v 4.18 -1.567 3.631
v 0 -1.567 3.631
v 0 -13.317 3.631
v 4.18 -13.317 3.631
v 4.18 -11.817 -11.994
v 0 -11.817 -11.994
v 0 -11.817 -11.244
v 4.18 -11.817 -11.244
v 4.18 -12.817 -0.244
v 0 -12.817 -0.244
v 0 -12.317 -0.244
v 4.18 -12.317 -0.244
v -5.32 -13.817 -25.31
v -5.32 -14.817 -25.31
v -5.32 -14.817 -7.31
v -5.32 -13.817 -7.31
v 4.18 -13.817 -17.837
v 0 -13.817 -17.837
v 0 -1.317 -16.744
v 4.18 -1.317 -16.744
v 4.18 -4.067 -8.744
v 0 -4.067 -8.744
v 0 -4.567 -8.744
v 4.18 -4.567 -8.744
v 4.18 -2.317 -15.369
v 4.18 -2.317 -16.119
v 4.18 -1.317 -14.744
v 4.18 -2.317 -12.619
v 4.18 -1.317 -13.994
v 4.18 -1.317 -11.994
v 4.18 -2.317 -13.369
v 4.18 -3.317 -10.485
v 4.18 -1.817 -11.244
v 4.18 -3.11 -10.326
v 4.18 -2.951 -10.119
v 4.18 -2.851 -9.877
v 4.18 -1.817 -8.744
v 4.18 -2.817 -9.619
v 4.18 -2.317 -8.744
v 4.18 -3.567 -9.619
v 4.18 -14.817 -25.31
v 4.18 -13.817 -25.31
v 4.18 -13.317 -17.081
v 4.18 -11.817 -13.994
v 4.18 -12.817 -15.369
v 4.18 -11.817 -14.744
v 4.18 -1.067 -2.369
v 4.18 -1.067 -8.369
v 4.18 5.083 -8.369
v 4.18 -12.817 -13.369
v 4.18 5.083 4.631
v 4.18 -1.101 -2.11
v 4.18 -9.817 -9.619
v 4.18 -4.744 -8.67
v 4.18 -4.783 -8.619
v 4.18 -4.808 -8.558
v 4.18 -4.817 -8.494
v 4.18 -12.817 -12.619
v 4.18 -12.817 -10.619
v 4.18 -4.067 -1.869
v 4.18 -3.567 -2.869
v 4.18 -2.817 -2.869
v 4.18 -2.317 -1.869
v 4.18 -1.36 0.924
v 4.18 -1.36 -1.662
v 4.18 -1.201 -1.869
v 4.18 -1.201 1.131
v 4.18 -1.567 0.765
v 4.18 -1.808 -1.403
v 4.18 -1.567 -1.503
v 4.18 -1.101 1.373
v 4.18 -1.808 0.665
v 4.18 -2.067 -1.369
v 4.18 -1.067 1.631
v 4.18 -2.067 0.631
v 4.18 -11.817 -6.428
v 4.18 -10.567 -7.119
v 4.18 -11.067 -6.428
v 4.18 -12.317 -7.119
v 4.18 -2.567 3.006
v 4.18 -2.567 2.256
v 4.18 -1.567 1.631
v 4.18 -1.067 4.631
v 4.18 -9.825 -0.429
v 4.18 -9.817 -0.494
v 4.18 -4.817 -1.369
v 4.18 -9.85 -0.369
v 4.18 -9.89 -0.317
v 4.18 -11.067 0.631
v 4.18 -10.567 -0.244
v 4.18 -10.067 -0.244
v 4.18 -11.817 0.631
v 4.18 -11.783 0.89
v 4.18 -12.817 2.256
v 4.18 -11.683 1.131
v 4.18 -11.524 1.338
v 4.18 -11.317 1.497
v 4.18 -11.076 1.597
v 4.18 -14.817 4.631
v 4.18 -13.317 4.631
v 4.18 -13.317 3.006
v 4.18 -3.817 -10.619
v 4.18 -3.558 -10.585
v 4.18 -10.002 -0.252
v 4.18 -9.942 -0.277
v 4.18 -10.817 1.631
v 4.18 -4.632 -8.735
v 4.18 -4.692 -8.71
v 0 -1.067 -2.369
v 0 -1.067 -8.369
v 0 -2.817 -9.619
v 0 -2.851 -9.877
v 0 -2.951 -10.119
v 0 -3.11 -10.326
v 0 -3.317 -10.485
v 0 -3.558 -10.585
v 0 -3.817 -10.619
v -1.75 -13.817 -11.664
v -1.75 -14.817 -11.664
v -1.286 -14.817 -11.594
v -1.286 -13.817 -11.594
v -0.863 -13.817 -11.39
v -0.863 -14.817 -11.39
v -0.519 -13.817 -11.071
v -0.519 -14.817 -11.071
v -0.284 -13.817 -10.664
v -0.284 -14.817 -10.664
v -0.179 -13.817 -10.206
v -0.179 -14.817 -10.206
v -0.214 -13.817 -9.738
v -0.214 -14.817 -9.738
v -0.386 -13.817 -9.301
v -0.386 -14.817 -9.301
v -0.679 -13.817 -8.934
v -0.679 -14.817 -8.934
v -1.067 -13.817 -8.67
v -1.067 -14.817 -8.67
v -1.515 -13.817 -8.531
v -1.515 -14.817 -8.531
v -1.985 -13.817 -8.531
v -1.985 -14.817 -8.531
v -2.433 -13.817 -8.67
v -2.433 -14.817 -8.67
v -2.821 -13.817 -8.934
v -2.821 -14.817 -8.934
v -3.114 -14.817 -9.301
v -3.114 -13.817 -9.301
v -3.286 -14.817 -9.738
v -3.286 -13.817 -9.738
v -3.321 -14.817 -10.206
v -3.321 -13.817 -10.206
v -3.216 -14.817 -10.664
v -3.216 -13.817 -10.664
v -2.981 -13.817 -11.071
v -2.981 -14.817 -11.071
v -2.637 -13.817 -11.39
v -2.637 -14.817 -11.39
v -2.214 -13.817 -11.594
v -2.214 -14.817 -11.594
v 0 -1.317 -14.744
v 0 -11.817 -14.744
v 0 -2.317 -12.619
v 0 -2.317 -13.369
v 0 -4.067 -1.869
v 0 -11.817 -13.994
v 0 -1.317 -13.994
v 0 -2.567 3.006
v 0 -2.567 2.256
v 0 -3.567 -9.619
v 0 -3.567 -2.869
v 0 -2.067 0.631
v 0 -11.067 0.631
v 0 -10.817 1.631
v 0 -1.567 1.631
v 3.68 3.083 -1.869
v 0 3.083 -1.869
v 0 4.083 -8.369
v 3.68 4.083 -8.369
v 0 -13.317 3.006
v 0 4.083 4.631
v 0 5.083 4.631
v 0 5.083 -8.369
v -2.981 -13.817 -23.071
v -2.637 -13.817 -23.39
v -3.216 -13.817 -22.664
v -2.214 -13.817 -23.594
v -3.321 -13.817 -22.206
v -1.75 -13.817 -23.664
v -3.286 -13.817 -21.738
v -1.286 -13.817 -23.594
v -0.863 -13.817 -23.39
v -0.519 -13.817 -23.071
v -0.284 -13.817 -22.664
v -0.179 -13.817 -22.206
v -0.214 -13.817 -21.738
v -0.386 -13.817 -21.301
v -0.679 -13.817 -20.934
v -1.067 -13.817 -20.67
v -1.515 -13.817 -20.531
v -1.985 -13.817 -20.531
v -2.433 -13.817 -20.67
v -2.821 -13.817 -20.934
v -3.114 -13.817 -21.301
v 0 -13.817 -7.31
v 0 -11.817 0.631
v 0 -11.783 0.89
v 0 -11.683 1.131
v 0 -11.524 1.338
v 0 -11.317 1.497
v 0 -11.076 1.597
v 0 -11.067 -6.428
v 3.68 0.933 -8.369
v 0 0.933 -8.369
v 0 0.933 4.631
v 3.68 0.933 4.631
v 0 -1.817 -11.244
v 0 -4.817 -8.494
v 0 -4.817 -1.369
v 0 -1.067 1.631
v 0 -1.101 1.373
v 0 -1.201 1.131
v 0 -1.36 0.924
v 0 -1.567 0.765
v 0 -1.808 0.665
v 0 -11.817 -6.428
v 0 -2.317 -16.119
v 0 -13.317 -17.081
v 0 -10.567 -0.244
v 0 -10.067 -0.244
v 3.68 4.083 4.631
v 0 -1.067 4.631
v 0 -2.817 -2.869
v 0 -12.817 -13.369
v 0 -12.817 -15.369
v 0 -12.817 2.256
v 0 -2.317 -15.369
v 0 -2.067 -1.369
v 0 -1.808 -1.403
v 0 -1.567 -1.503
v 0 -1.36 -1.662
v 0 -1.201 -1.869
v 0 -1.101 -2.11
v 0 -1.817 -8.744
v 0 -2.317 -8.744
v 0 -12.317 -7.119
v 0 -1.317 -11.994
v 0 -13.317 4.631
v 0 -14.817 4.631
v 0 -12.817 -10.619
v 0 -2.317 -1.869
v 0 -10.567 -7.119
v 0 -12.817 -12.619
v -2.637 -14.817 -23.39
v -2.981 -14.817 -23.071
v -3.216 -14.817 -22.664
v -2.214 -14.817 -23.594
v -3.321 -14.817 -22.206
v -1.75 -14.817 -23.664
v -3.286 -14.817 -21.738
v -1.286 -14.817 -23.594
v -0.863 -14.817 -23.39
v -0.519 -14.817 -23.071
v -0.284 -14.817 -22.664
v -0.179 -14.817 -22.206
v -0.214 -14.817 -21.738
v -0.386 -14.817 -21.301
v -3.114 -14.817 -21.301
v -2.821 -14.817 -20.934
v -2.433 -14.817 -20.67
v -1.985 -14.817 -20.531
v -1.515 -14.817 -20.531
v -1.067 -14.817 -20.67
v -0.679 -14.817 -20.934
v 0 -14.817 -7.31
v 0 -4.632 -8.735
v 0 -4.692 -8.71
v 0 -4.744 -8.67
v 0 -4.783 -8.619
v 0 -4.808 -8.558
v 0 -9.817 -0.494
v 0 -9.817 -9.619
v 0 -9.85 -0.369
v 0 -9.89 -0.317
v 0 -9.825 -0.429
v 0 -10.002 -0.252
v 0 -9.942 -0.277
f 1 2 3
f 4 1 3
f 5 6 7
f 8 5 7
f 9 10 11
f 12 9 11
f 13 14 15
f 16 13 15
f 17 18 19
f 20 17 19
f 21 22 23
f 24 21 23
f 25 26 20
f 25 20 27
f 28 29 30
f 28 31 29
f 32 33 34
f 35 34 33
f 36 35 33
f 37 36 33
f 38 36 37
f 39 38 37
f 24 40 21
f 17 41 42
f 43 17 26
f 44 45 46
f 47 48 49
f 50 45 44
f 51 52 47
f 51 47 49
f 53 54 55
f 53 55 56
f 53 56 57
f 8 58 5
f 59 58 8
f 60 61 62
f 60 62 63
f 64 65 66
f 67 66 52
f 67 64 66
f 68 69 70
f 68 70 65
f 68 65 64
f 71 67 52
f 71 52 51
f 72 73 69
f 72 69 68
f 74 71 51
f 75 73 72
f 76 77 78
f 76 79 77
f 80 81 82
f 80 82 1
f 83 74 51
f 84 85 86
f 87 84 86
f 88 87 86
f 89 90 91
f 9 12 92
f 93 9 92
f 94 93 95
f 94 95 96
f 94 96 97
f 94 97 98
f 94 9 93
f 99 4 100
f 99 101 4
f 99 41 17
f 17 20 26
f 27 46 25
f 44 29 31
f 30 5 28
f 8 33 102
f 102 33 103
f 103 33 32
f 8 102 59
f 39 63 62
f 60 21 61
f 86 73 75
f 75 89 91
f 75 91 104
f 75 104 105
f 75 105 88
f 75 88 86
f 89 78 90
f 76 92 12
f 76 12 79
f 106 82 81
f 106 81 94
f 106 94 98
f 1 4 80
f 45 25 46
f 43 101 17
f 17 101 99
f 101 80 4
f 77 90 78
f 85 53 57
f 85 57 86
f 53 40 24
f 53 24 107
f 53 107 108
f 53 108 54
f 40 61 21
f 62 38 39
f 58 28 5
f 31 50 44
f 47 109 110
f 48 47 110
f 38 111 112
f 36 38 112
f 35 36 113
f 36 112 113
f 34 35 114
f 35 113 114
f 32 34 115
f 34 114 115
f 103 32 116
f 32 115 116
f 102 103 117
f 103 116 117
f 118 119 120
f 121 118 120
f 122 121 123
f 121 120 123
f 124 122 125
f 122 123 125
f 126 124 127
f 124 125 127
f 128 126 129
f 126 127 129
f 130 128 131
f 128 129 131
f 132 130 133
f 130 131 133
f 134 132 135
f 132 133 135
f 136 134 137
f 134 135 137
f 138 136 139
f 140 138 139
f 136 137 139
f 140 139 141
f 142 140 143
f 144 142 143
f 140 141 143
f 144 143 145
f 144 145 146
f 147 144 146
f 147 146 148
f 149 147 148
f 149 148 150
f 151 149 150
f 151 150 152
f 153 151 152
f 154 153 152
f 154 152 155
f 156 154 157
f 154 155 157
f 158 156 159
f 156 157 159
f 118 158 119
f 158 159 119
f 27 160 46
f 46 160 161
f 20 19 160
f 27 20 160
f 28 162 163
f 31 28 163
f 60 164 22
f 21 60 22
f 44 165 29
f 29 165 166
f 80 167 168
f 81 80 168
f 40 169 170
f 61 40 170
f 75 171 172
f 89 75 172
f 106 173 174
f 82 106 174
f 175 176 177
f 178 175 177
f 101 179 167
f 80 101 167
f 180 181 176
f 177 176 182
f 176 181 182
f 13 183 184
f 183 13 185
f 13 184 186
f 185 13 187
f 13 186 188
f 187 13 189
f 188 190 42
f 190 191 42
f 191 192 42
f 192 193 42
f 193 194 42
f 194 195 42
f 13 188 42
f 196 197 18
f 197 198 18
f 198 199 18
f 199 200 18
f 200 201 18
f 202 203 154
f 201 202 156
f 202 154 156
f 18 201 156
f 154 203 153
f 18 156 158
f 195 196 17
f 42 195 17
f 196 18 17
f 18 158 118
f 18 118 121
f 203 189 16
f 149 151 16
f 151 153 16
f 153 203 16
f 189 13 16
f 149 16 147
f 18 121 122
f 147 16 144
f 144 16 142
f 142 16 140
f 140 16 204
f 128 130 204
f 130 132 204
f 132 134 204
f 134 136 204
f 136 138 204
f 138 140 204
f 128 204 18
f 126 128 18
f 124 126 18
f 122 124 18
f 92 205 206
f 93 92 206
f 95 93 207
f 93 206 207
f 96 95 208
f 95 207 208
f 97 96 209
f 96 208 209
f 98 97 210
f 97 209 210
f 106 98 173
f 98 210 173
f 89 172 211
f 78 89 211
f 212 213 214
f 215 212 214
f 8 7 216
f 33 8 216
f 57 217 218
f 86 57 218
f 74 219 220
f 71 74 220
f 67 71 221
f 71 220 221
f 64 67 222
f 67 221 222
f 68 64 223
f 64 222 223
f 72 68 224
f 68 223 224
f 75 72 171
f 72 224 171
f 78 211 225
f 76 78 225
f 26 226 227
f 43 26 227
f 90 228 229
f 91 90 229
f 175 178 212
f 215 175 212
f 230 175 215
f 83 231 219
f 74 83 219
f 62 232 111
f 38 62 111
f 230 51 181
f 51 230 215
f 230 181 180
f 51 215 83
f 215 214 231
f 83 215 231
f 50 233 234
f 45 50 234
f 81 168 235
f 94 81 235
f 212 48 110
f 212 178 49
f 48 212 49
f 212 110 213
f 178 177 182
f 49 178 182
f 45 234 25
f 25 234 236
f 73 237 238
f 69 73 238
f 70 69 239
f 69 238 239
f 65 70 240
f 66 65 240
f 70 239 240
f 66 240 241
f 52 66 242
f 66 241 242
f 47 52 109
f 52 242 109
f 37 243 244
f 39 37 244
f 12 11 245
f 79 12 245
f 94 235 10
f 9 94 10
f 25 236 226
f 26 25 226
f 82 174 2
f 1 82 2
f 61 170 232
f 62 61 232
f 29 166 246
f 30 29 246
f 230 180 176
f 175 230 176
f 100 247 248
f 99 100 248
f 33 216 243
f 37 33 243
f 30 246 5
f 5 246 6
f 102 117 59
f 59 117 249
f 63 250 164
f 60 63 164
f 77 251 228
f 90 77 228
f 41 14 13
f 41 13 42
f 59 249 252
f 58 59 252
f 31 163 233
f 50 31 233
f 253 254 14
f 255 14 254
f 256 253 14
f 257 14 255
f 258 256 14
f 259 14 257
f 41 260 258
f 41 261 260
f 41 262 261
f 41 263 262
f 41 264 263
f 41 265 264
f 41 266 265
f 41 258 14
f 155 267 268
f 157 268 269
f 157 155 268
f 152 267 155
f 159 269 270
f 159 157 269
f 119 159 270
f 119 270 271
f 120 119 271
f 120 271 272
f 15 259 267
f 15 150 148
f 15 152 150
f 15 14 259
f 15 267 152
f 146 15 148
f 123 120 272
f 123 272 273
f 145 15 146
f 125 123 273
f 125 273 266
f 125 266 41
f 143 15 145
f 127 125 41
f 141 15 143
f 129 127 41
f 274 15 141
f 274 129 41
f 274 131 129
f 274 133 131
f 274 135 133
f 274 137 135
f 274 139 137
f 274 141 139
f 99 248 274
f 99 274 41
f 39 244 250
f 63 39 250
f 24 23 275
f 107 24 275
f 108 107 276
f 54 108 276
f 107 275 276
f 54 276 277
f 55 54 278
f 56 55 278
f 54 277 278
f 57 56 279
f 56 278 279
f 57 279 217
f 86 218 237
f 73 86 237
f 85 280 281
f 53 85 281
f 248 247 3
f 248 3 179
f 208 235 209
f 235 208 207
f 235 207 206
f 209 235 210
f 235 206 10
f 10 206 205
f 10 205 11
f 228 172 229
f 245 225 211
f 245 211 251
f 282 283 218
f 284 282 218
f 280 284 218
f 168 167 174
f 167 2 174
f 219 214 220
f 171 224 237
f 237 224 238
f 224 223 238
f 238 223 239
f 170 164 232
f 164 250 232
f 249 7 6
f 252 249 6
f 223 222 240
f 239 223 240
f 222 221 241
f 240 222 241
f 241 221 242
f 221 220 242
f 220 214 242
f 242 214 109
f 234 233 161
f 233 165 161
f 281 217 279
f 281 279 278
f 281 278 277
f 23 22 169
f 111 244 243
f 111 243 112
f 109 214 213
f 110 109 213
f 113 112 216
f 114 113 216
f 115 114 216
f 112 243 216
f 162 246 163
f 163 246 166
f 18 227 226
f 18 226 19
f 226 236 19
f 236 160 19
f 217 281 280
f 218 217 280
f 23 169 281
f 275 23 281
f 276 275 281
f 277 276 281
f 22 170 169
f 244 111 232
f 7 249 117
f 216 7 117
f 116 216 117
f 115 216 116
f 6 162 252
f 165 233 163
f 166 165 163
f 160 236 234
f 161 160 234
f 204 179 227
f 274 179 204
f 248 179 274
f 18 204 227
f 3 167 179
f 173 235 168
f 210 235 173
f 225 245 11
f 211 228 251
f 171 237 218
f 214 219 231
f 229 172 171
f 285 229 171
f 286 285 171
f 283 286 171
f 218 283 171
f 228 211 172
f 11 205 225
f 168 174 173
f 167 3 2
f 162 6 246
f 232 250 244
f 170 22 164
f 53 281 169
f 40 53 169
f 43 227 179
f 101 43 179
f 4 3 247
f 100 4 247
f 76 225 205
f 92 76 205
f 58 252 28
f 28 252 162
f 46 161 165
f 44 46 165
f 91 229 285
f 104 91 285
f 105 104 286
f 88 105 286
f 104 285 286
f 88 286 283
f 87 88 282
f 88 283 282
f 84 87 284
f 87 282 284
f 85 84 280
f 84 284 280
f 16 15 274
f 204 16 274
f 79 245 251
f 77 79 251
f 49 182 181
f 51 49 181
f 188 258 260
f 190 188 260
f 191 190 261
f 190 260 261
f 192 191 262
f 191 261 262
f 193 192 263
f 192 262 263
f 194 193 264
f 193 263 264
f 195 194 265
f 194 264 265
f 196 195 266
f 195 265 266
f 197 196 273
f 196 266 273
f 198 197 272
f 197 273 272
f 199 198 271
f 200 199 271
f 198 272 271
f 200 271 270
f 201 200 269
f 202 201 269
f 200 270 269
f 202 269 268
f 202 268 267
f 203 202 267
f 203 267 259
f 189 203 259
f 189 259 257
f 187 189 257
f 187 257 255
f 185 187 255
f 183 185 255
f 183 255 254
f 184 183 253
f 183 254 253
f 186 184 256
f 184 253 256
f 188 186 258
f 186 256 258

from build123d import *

# Parameters (mm, degrees)
FLEXURE_BOSS_DEPTH            = 4.18
SKETCH2_W                     = 9.5
SKETCH2_H                     = 18
SKETCH2_R                     = 1.575
MOUNTING_PLATE_BOSS_DEPTH     = 1
DOVETAIL_CONNECTION_CUT_DEPTH = 3.68


with BuildPart() as part:
    # Sketch1 → Flexure Boss (new body)
    with BuildSketch(Plane(origin=(0, 0, 0), x_dir=(0, 0, -1), z_dir=(1, 0, 0))):
        with BuildLine():
            Line((2.368651747, -1.066915143), (8.368651984, -1.066915143))
            Line((8.368651984, -1.066915143), (8.368651984, 5.083084857))
            Line((8.368651984, 5.083084857), (-4.631348016, 5.083084857))
            Line((-4.631348016, 5.083084857), (-4.631348016, -1.066915143))
            Line((-4.631348016, -1.066915143), (-1.631348253, -1.066915143))
            ThreePointArc((-1.631348253, -1.066915143), (-0.924241471, -1.359808362), (-0.631348253, -2.066915143))
            Line((-0.631348253, -2.066915143), (-0.631348253, -11.066916497))
            Line((-0.631348253, -11.066916497), (6.427805299, -11.066916497))
            Line((6.427805299, -11.066916497), (6.427805299, -11.816916497))
            Line((6.427805299, -11.816916497), (-0.63134937, -11.816916497))
            ThreePointArc((-0.63134937, -11.816916497), (-1.338456151, -11.524023278), (-1.63134937, -10.816916497))
            Line((-1.63134937, -10.816916497), (-1.63134937, -1.566915143))
            Line((-1.63134937, -1.566915143), (-3.63134937, -1.566915143))
            Line((-3.63134937, -1.566915143), (-3.63134937, -13.316915143))
            Line((-3.63134937, -13.316915143), (-4.631348016, -13.316915143))
            Line((-4.631348016, -13.316915143), (-4.631348016, -14.816915143))
            Line((-4.631348016, -14.816915143), (17.924748705, -14.816915143))
            Line((17.924748705, -14.816915143), (16.743651747, -1.316915143))
            Line((16.743651747, -1.316915143), (14.743651747, -1.316915143))
            Line((14.743651747, -1.316915143), (14.743651747, -11.816915143))
            Line((14.743651747, -11.816915143), (13.993651747, -11.816915143))
            Line((13.993651747, -11.816915143), (13.993651747, -1.316915143))
            Line((13.993651747, -1.316915143), (11.993651747, -1.316915143))
            Line((11.993651747, -1.316915143), (11.993651747, -11.816915143))
            Line((11.993651747, -11.816915143), (11.243651747, -11.816915143))
            Line((11.243651747, -11.816915143), (11.243651747, -1.816915143))
            Line((11.243651747, -1.816915143), (8.743651747, -1.816915143))
            Line((8.743651747, -1.816915143), (8.743651747, -2.316915143))
            Line((8.743651747, -2.316915143), (1.868651747, -2.316915143))
            Line((1.868651747, -2.316915143), (1.868651747, -4.066915143))
            Line((1.868651747, -4.066915143), (8.743651747, -4.066915143))
            Line((8.743651747, -4.066915143), (8.743651747, -4.566915143))
            ThreePointArc((8.743651747, -4.566915143), (8.670428443, -4.743691838), (8.493651747, -4.816915143))
            Line((8.493651747, -4.816915143), (1.368651747, -4.816915143))
            Line((1.368651747, -4.816915143), (1.368651747, -2.066915143))
            ThreePointArc((1.368651747, -2.066915143), (1.661544966, -1.359808362), (2.368651747, -1.066915143))
        make_face()
        with BuildLine():
            Line((0.493651747, -9.816916497), (9.618651747, -9.816916497))
            Line((9.618651747, -9.816916497), (9.618651747, -3.566915143))
            Line((9.618651747, -3.566915143), (2.868650393, -3.566915143))
            Line((2.868650393, -3.566915143), (2.868650393, -2.816915143))
            Line((2.868650393, -2.816915143), (9.618651747, -2.816915143))
            ThreePointArc((9.618651747, -2.816915143), (10.325758529, -3.109808362), (10.618651747, -3.816915143))
            Line((10.618651747, -3.816915143), (10.618651747, -12.816913789))
            Line((10.618651747, -12.816913789), (12.618651747, -12.816913789))
            Line((12.618651747, -12.816913789), (12.618651747, -2.316912435))
            Line((12.618651747, -2.316912435), (13.368651747, -2.316912435))
            Line((13.368651747, -2.316912435), (13.368651747, -12.816913789))
            Line((13.368651747, -12.816913789), (15.368651747, -12.816913789))
            Line((15.368651747, -12.816913789), (15.368651747, -2.316912435))
            Line((15.368651747, -2.316912435), (16.118651747, -2.316912435))
            Line((16.118651747, -2.316912435), (17.081027283, -13.316915143))
            Line((17.081027283, -13.316915143), (-3.00634937, -13.316915143))
            Line((-3.00634937, -13.316915143), (-3.00634937, -2.566915143))
            Line((-3.00634937, -2.566915143), (-2.25634937, -2.566915143))
            Line((-2.25634937, -2.566915143), (-2.25634937, -12.816916497))
            Line((-2.25634937, -12.816916497), (0.24365063, -12.816916497))
            Line((0.24365063, -12.816916497), (0.24365063, -12.316916497))
            Line((0.24365063, -12.316916497), (7.11865063, -12.316916497))
            Line((7.11865063, -12.316916497), (7.11865063, -10.566916497))
            Line((7.11865063, -10.566916497), (0.243651747, -10.566916497))
            Line((0.243651747, -10.566916497), (0.243651747, -10.066916497))
            ThreePointArc((0.243651747, -10.066916497), (0.316875052, -9.890139802), (0.493651747, -9.816916497))
        make_face(mode=Mode.SUBTRACT)
    extrude(amount=FLEXURE_BOSS_DEPTH)

    # Sketch2 → Mounting Plate Boss (add)
    with BuildSketch(Plane.XZ.offset(14.816915143)):
        with Locations((-0.57, -16.309568548)):
            Rectangle(SKETCH2_W, SKETCH2_H)
        with Locations(Location((-1.75, -10.088651984, 0), (0, 0, 270))):
            Circle(SKETCH2_R, mode=Mode.SUBTRACT)
        with Locations(Location((-1.75, -22.088651984, 0), (0, 0, 270))):
            Circle(SKETCH2_R, mode=Mode.SUBTRACT)
    extrude(amount=-MOUNTING_PLATE_BOSS_DEPTH)

    # Sketch7 → Dovetail Connection Cut (cut)
    with BuildSketch(Plane.ZY):
        Polygon((-8.368651984, 0.933084857), (4.631348016, 0.933084857), (4.631348016, 4.083084857), (-1.868651984, 3.083084857), (-8.368651984, 4.083084857), align=None)
    extrude(amount=-DOVETAIL_CONNECTION_CUT_DEPTH, mode=Mode.SUBTRACT)


solid = part.part
